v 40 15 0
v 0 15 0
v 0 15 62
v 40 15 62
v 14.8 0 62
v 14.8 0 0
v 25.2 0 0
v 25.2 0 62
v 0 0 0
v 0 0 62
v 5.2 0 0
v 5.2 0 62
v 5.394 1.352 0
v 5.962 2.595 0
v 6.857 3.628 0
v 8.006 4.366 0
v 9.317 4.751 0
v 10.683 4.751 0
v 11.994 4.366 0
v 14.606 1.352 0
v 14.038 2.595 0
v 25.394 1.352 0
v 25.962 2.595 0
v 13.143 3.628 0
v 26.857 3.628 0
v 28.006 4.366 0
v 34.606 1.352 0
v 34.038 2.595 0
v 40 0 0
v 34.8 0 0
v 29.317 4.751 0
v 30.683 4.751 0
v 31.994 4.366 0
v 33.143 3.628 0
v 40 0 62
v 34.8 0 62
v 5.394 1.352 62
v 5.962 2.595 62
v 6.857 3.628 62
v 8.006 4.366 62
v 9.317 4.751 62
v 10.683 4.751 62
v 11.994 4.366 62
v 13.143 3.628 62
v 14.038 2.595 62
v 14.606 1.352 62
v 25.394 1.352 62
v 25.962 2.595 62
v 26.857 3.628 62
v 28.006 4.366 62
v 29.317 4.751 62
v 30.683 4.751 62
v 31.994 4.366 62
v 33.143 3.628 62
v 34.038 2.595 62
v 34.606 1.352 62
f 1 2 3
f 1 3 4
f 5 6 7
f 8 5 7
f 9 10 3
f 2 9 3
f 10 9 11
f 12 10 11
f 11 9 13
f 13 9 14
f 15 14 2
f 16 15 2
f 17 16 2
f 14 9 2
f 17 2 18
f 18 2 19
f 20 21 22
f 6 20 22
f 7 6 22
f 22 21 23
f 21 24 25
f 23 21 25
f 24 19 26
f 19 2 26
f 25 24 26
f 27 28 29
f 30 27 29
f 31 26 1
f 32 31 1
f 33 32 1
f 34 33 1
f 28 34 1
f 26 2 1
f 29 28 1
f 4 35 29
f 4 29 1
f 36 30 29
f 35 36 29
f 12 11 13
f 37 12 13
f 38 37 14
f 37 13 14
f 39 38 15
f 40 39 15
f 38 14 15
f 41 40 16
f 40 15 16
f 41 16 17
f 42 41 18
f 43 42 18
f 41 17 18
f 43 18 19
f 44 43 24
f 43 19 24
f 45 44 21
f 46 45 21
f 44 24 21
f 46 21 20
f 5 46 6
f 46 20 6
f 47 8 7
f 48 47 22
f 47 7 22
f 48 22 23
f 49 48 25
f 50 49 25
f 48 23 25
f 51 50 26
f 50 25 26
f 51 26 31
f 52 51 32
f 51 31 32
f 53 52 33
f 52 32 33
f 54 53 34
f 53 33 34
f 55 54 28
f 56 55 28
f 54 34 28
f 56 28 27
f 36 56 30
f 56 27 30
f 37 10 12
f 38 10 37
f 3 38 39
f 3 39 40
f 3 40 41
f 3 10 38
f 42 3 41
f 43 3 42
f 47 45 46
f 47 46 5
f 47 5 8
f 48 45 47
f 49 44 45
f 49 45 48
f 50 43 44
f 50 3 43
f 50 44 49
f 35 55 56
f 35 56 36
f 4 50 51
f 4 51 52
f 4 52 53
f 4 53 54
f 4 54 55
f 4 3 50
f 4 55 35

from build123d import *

# Parameters (mm, degrees)
F0_W     = 40
F0_H     = 15
F1_DEPTH = 62
F3_DEPTH = 62.001


with BuildPart() as f1:
    # F0 (on Top) → F1 (new body)
    with BuildSketch(Plane.XY):
        with Locations((20, 7.5)):
            Rectangle(F0_W, F0_H)
    extrude(amount=F1_DEPTH)

    # F2 (on face) → F3 (cut, through all)
    with BuildSketch(Plane(origin=(0, 0, 0), x_dir=(1, 0, 0), z_dir=(0, 0, -1))):
        with BuildLine():
            Line((14.8, 0), (5.2, 0))
            ThreePointArc((5.2, 0), (10, -4.8), (14.8, 0))
        make_face()
        with BuildLine():
            Line((34.8, 0), (25.2, 0))
            ThreePointArc((25.2, 0), (30, -4.8), (34.8, 0))
        make_face()
    extrude(amount=-F3_DEPTH, mode=Mode.SUBTRACT)


solid = f1.part
